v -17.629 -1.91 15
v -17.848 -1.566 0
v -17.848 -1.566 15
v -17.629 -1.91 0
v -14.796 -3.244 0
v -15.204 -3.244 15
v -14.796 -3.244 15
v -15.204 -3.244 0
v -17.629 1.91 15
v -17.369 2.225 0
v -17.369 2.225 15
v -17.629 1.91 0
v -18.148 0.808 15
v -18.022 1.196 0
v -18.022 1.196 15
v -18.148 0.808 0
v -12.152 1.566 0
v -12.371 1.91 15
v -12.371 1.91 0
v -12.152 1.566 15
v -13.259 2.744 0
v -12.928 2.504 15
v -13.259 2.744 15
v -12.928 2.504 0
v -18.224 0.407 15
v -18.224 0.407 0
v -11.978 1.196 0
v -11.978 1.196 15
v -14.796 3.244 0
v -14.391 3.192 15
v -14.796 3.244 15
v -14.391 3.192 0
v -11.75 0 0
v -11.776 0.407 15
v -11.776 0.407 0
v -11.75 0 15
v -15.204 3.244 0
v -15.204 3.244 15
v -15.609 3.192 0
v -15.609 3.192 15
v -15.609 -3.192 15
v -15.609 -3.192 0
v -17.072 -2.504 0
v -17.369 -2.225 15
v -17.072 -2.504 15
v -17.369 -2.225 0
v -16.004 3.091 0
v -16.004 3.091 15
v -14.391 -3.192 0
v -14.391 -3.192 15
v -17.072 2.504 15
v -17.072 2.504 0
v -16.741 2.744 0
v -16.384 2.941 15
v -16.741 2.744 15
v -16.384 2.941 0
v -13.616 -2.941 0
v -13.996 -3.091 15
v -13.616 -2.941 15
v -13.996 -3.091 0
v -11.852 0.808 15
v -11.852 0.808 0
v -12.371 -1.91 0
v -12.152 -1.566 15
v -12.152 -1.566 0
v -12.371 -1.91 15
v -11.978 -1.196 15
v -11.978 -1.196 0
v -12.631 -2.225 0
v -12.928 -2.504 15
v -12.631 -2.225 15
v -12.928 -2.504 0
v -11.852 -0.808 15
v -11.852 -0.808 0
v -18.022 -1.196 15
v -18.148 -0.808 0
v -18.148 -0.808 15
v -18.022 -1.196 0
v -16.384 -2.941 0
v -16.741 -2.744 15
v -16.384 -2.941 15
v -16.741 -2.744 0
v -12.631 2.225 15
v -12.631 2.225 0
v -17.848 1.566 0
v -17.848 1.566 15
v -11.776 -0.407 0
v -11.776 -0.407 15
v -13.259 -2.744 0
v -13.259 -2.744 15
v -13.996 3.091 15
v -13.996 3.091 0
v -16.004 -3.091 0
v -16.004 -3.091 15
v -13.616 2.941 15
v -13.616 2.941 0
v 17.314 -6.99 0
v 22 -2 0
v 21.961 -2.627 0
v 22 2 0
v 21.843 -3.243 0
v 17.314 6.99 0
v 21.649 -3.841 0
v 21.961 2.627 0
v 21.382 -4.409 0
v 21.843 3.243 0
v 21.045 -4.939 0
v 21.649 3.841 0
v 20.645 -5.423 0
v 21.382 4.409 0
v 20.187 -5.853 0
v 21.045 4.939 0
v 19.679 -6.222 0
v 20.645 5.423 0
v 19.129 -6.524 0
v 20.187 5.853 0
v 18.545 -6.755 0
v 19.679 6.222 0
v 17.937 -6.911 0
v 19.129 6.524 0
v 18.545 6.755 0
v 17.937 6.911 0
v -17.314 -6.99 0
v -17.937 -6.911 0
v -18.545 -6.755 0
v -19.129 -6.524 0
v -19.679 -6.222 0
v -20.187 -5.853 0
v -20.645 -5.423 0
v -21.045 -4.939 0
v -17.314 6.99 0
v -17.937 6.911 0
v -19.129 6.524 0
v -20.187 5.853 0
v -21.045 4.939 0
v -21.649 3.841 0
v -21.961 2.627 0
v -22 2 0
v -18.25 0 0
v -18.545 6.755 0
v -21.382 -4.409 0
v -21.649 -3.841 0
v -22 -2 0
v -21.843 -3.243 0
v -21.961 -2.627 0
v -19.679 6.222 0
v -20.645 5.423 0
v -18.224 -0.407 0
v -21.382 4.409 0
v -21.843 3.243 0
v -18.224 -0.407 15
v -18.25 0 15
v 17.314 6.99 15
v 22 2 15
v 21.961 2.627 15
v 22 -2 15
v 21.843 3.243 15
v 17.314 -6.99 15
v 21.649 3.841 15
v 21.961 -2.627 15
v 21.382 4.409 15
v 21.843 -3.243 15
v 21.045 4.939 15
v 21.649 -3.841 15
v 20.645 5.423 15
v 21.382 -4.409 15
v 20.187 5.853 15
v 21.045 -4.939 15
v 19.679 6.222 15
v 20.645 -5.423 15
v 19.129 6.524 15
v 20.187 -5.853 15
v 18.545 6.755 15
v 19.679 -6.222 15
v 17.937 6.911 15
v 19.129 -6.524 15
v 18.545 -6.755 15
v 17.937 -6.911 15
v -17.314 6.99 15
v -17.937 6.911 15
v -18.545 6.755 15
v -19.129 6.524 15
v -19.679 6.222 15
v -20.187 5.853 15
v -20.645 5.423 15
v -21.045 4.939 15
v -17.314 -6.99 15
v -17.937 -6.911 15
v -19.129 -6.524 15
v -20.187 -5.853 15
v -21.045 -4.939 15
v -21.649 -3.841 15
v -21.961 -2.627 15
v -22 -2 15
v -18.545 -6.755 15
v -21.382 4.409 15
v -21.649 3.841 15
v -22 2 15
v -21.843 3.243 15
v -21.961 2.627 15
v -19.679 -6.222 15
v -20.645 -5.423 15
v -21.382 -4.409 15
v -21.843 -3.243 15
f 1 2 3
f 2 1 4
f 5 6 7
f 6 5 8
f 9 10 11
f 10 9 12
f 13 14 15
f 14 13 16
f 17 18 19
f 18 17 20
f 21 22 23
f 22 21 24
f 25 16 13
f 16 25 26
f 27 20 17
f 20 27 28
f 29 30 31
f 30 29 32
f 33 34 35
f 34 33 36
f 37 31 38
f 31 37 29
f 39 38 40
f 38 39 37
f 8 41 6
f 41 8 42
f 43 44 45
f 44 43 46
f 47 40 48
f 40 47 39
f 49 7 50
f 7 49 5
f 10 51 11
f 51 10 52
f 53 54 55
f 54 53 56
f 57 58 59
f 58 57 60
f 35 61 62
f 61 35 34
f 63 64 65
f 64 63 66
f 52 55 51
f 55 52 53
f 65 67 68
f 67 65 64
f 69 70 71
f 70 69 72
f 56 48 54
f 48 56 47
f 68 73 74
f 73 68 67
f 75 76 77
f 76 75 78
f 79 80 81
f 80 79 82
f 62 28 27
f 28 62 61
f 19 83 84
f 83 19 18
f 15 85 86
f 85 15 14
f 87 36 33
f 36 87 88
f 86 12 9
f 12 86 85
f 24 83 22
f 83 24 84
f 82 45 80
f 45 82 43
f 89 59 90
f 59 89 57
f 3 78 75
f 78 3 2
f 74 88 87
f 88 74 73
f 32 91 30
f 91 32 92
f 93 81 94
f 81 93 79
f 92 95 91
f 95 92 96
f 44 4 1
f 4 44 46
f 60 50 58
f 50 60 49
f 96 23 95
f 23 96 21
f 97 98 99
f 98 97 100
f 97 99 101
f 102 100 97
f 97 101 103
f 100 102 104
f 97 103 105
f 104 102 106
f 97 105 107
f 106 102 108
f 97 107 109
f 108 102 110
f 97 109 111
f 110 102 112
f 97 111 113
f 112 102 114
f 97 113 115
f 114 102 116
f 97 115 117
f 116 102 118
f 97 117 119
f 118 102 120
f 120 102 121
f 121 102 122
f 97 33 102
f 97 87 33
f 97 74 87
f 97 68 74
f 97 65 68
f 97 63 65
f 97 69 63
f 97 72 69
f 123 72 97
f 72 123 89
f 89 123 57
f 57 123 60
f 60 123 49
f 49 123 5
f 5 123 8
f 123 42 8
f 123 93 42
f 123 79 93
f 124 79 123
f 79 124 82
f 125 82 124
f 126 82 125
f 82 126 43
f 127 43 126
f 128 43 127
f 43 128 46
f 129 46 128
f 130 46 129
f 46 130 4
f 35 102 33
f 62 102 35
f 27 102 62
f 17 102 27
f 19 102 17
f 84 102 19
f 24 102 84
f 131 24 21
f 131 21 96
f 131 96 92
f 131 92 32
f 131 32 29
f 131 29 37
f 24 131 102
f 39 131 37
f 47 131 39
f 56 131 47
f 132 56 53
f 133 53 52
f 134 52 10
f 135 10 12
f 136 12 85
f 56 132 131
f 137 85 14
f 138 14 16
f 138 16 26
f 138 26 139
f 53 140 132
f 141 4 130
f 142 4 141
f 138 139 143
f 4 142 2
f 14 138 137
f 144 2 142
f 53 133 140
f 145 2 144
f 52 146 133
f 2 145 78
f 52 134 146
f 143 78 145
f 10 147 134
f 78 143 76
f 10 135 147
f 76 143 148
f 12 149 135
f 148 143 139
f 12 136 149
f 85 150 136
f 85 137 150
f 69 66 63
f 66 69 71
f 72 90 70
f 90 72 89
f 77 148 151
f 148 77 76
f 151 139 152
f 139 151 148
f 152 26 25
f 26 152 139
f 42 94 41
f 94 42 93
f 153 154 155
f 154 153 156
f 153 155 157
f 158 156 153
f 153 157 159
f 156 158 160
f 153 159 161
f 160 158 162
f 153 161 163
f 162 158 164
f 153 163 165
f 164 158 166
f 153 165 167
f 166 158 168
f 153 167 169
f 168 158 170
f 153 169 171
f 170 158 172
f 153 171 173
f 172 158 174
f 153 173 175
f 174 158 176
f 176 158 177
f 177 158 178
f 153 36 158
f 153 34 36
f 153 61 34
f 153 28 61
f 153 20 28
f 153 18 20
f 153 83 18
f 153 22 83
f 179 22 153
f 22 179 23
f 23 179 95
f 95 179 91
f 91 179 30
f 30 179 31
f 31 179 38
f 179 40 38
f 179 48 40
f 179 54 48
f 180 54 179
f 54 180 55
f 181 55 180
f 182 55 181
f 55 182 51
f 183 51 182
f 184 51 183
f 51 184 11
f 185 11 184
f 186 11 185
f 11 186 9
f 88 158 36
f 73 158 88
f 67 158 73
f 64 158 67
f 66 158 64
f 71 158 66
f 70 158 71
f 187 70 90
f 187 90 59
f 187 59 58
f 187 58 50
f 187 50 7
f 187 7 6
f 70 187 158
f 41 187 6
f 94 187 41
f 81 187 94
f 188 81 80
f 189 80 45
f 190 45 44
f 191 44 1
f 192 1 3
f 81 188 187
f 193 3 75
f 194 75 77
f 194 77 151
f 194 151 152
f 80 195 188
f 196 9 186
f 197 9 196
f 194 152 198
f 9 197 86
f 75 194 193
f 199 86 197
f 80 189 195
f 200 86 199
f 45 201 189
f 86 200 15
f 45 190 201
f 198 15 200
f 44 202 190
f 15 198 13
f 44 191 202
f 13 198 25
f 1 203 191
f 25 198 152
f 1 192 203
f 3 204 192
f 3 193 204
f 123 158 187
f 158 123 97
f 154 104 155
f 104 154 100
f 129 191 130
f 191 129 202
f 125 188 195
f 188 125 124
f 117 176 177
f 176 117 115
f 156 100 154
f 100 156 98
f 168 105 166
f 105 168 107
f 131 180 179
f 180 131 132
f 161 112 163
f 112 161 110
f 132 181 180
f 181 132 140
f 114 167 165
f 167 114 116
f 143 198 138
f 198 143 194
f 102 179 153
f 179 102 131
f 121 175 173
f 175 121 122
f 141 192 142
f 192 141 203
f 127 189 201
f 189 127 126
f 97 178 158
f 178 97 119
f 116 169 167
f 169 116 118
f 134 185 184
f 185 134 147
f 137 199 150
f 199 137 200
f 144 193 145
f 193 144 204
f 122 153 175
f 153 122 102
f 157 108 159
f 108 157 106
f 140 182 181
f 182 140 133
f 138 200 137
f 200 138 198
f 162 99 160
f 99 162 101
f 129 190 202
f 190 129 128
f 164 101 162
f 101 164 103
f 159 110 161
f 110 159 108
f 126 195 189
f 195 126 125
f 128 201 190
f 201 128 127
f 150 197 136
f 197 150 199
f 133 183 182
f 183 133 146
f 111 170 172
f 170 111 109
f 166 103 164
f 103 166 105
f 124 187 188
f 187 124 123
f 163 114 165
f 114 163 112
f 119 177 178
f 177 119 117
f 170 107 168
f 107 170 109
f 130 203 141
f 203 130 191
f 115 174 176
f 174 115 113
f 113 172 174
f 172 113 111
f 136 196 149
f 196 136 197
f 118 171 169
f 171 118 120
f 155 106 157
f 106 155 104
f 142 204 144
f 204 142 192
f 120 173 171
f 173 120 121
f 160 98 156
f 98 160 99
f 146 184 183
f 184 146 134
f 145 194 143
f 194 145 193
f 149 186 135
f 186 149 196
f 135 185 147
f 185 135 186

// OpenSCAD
$fn = 50;


difference() {
	union() {
		hull() {
			translate(v = [-17.0000000000, 2.0000000000, 0]) {
				cylinder(h = 15, r = 5);
			}
			translate(v = [17.0000000000, 2.0000000000, 0]) {
				cylinder(h = 15, r = 5);
			}
			translate(v = [-17.0000000000, -2.0000000000, 0]) {
				cylinder(h = 15, r = 5);
			}
			translate(v = [17.0000000000, -2.0000000000, 0]) {
				cylinder(h = 15, r = 5);
			}
		}
	}
	union() {
		translate(v = [-15.0000000000, 0.0000000000, 0]) {
			cylinder(h = 15, r = 3.2500000000);
		}
		translate(v = [-15.0000000000, 0.0000000000, 0]) {
			cylinder(h = 15, r = 1.8000000000);
		}
		translate(v = [-15.0000000000, 0.0000000000, 0]) {
			cylinder(h = 15, r = 1.8000000000);
		}
		translate(v = [-15.0000000000, 0.0000000000, 0]) {
			cylinder(h = 15, r = 1.8000000000);
		}
	}
}
